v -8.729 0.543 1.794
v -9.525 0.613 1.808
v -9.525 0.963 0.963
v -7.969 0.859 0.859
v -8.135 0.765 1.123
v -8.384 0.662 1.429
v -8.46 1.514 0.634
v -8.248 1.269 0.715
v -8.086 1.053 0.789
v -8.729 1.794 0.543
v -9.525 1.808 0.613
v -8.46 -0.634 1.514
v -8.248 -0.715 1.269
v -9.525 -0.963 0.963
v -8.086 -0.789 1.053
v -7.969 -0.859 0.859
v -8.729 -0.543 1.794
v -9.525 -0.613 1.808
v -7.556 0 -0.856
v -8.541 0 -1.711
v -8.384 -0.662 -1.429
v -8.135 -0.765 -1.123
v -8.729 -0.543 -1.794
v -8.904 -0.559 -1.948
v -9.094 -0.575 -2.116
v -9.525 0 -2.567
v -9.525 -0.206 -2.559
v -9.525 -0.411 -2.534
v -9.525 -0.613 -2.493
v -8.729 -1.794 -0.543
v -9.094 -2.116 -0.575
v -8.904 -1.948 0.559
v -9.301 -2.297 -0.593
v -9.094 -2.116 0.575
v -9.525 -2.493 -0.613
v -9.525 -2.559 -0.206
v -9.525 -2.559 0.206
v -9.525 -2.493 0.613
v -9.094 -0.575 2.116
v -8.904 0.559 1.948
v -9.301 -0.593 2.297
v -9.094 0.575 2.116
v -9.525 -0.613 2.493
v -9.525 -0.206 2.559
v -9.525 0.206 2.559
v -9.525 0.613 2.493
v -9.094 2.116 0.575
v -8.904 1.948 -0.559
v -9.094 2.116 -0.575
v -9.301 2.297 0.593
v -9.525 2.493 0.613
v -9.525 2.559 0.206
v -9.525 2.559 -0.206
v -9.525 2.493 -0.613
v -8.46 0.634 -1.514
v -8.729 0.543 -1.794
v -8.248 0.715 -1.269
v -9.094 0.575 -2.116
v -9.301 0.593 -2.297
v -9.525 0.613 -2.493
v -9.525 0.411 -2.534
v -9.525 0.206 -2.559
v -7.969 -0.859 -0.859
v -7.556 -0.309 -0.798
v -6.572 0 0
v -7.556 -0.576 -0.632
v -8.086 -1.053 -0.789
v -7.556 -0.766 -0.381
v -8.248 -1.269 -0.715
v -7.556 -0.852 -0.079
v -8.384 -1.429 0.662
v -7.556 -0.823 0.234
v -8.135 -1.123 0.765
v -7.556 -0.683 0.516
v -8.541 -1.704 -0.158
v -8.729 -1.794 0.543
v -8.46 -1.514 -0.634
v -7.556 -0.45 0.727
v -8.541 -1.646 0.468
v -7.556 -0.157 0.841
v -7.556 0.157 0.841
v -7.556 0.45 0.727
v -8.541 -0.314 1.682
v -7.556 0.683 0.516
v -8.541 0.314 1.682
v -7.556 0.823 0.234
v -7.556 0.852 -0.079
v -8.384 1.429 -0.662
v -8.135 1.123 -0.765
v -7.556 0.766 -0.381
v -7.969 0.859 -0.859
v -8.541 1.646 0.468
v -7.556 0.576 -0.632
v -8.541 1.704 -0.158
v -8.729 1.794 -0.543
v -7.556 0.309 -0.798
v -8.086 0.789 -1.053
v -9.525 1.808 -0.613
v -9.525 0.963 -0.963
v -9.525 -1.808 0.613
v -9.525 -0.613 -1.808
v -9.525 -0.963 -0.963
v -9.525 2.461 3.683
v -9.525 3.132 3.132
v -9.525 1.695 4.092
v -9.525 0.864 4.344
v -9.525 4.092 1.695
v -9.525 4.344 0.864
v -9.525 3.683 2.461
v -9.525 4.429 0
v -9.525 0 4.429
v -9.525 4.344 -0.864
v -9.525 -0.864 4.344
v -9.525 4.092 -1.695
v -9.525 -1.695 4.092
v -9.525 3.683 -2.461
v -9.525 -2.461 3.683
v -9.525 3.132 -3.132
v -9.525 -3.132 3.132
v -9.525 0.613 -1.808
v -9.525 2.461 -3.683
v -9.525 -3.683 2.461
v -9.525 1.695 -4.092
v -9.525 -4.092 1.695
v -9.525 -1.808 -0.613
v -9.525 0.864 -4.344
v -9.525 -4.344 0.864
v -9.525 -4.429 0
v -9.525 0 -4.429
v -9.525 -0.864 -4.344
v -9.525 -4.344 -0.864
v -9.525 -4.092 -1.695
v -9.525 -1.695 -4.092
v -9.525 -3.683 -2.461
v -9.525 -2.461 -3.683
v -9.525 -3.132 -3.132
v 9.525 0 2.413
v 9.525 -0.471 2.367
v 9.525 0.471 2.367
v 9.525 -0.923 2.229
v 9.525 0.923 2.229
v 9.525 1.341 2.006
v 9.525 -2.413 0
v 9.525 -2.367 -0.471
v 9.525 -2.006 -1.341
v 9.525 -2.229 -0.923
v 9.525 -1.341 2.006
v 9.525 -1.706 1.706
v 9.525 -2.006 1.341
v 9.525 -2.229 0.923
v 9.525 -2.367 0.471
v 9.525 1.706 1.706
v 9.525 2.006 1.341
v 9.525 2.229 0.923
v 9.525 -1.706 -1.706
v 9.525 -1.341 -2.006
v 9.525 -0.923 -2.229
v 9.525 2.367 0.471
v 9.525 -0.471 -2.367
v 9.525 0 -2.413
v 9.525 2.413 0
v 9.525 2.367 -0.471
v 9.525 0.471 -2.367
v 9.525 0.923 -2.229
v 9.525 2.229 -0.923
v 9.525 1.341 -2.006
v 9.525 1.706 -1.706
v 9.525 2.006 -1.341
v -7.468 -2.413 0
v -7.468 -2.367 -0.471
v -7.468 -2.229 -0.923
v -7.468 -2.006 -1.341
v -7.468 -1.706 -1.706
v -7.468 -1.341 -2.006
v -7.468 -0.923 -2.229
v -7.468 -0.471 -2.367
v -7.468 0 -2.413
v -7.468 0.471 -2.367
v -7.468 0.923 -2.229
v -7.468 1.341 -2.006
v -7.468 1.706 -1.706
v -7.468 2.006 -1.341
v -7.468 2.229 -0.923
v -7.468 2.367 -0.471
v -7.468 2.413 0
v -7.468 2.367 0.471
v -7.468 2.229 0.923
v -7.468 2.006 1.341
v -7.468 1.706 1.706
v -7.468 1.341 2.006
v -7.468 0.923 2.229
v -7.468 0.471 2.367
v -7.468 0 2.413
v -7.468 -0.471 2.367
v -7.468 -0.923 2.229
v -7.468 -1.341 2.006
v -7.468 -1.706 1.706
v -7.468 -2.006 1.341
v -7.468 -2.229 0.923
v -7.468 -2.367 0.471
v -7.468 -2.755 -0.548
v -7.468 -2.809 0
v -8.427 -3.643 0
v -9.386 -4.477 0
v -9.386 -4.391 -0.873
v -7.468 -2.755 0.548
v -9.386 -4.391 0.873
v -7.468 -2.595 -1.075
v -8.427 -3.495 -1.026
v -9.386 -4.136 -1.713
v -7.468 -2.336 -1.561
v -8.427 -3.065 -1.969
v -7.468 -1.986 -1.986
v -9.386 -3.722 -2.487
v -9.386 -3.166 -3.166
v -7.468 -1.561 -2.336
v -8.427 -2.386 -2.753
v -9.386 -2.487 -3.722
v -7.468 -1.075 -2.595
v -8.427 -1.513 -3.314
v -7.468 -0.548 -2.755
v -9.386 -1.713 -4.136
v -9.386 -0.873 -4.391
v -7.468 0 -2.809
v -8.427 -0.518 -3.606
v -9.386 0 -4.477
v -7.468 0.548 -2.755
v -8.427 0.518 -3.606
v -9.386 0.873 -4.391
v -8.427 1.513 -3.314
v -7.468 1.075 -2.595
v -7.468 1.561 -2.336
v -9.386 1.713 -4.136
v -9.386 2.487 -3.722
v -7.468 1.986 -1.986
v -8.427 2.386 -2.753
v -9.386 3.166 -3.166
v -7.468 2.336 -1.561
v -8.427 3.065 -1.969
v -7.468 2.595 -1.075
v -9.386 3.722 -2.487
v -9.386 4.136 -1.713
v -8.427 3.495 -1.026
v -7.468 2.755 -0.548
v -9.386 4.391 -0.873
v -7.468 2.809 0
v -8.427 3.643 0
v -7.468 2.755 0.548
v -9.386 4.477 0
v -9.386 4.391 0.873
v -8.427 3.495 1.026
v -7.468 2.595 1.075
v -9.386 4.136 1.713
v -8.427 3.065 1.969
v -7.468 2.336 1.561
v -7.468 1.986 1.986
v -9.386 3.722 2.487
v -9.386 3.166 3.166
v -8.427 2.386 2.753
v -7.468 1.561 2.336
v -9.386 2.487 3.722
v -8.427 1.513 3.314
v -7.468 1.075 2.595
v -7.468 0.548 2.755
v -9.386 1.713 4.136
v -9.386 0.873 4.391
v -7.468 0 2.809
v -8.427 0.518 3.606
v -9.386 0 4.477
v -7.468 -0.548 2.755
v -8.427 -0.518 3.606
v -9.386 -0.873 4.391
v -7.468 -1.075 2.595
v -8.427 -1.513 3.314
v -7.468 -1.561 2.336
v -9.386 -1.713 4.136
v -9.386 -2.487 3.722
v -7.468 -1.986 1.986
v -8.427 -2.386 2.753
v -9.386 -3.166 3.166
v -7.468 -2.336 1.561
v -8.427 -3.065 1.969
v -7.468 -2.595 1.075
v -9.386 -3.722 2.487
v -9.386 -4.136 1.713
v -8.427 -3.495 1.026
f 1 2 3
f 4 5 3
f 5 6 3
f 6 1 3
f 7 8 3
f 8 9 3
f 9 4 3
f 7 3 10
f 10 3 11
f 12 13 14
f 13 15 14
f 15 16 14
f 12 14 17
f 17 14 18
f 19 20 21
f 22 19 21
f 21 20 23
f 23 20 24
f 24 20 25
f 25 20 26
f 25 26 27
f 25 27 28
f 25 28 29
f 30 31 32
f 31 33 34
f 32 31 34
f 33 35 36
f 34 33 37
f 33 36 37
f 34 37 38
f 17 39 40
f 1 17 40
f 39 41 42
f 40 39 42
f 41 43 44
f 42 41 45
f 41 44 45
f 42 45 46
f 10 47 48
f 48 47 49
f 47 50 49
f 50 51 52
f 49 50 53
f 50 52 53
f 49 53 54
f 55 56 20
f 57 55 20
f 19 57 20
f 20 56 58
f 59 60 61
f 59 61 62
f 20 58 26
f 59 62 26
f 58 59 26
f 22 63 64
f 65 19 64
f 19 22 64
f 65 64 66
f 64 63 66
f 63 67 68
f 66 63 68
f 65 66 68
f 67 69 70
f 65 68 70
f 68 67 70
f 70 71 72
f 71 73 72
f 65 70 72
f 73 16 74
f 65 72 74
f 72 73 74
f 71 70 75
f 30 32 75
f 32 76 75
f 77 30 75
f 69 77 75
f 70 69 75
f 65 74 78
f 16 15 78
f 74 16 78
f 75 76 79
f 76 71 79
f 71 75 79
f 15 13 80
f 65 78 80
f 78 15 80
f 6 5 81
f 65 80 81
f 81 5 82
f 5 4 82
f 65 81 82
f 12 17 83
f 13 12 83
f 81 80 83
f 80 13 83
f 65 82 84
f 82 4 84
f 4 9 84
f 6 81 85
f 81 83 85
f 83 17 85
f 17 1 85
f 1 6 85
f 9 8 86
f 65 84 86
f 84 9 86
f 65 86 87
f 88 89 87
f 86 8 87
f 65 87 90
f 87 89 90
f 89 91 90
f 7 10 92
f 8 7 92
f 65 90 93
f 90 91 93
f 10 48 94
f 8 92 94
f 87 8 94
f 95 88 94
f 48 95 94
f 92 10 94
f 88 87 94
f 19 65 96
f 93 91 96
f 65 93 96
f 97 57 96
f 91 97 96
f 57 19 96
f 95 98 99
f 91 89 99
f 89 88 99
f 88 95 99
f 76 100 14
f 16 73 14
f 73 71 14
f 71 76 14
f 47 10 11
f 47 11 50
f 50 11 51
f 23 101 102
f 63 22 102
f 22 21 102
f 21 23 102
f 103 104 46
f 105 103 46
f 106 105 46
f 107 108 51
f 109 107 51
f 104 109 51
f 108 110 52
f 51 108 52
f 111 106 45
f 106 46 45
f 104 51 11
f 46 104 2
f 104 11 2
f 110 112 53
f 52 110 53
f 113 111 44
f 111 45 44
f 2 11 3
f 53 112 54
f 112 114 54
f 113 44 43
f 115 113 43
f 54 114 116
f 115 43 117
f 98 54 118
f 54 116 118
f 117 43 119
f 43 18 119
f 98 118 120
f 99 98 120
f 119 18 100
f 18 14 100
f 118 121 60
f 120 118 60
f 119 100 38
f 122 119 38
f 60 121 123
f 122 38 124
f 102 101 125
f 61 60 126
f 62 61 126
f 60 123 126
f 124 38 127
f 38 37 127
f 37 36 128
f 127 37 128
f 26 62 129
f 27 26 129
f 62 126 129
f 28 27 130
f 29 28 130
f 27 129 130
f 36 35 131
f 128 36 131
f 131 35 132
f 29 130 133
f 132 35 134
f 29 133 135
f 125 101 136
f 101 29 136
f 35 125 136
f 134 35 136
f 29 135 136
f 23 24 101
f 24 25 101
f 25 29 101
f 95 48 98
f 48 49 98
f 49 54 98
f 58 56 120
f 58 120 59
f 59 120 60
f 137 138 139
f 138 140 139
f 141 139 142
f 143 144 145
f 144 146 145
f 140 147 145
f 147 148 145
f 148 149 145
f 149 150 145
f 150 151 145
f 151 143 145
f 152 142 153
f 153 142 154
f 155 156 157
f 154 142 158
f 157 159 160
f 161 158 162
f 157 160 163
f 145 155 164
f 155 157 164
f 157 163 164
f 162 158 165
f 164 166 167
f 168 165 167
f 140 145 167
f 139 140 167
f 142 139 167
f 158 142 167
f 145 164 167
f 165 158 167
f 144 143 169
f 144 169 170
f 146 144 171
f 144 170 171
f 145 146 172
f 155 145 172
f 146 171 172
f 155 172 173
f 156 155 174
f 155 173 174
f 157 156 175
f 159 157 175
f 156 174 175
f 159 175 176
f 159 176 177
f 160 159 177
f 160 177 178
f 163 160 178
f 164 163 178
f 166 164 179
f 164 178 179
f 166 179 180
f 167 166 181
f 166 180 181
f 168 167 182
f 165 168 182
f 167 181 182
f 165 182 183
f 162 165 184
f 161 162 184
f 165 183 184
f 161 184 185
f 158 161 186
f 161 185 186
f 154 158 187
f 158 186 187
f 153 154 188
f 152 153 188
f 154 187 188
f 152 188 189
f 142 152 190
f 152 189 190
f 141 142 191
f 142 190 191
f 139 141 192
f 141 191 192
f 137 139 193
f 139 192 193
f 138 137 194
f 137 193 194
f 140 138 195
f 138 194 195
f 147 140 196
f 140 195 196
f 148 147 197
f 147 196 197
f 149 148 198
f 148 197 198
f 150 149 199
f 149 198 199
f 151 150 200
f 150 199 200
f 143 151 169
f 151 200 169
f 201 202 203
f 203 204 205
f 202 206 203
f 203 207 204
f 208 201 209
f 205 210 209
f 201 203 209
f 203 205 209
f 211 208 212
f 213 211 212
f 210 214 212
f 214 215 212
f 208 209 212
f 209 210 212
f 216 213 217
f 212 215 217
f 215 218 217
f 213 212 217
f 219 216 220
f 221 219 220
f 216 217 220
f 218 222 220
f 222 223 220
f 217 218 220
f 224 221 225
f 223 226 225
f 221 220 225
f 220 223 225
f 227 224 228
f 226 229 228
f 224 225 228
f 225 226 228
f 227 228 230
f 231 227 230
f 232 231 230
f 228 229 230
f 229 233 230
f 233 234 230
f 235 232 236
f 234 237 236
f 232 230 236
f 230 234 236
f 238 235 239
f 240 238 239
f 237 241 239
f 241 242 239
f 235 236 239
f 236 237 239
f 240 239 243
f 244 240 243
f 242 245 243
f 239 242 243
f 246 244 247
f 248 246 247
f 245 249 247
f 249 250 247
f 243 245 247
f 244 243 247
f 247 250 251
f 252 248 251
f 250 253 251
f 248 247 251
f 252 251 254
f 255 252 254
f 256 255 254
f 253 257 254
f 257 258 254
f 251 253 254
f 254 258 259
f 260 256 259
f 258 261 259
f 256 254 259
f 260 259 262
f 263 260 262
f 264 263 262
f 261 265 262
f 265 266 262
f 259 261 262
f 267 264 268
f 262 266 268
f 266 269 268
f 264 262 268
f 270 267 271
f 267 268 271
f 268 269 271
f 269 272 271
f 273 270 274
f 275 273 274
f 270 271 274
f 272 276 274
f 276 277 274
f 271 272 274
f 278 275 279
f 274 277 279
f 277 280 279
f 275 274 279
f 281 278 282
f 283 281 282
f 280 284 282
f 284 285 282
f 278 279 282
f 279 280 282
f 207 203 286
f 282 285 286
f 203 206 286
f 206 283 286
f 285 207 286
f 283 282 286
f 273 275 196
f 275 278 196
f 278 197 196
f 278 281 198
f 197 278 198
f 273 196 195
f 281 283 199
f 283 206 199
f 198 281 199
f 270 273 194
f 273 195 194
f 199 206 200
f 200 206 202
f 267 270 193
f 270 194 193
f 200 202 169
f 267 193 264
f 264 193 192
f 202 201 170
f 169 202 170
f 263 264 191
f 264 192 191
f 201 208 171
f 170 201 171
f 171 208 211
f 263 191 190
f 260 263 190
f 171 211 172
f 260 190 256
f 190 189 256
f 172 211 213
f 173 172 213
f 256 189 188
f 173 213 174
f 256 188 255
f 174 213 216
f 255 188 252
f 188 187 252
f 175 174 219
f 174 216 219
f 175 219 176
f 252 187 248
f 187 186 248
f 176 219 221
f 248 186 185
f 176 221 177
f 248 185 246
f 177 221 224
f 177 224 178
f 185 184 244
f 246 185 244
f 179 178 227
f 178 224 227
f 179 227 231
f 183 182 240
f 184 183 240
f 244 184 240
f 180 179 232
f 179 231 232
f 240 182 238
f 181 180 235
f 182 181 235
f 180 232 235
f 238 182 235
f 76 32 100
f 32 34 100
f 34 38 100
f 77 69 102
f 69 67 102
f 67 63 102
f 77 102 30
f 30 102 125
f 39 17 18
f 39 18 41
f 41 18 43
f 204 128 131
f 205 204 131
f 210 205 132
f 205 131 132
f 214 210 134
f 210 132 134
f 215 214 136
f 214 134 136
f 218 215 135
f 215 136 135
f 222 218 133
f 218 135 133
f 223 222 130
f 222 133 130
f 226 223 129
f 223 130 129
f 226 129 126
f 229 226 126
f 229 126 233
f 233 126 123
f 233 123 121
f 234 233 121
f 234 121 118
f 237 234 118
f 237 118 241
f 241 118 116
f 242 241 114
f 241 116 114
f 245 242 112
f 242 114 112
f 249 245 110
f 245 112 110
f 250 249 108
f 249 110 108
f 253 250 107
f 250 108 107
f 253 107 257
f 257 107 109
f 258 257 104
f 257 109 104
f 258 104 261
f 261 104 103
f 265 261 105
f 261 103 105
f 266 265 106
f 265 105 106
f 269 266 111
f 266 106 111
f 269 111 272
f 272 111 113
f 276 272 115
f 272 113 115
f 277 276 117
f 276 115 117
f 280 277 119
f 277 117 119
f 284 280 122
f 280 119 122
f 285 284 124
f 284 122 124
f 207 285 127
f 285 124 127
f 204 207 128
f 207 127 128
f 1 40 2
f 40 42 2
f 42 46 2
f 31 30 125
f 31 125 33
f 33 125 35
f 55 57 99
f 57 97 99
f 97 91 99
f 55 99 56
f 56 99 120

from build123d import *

# Parameters (mm, degrees)
CUT_EXTRUDE1_REACH = 22.129
CIRPATTERN1_COUNT  = 4
DRAFT1_ANGLE       = 5
CHAMFER1_SIZE      = 0.183896
CHAMFER1_SIZE2     = 0.168435197


with BuildPart() as part:
    # Sketch2 → Revolve1 (revolve)
    with BuildSketch(Plane.XY, mode=Mode.PRIVATE) as revolve1_sk:
        Polygon((-9.525, 0), (9.525, 0), (9.525, 2.413), (-7.4676, 2.413), (-7.4676, 2.808929466), (-9.525, 4.5974), align=None)
    revolve(revolve1_sk.sketch.rotate(Axis((-9.525, 0, 0), (1, 0, 0)), 180), axis=Axis((-9.525, 0, 0), (1, 0, 0)))

    # Cut-Extrude1: up to this cone (the profile starts inside it)
    cut_extrude1_end = Plane(origin=(-9.525, 0, 0), z_dir=(-1, 0, 0)).offset(-2.952835668) * Cone(1e-06, 24.469290226, 28.148697423, align=(Align.CENTER, Align.CENTER, Align.MIN), mode=Mode.PRIVATE)
    # Sketch3 → Cut-Extrude1 (cut, up to the surface)
    with BuildSketch(Plane.ZY.offset(9.525), mode=Mode.PRIVATE) as cut_extrude1_sk1:
        with BuildLine():
            Line((0, 0), (3.064933333, 0))
            ThreePointArc((3.064933333, 0), (3.04941298, 0.308053268), (3.003009105, 0.612986667))
            Line((3.003009105, 0.612986667), (1.807997886, 0.612986667))
            Line((1.807997886, 0.612986667), (0.962997349, 0.962997349))
            Line((0.962997349, 0.962997349), (0.612986667, 1.807997886))
            Line((0.612986667, 1.807997886), (0.612986667, 3.003009105))
            ThreePointArc((0.612986667, 3.003009105), (0.308053268, 3.04941298), (0, 3.064933333))
            Line((0, 3.064933333), (0, 0))
        make_face()
    cut_extrude1_tool1 = extrude(cut_extrude1_sk1.sketch, amount=-CUT_EXTRUDE1_REACH, mode=Mode.PRIVATE) & cut_extrude1_end
    cut_extrude1 = cut_extrude1_tool1.solids().sort_by_distance((-9.525, 1.532467, 0.043345))[0]
    add(cut_extrude1, mode=Mode.SUBTRACT)

    # CirPattern1: Cut-Extrude1 ×4 about axis
    cirpattern1_axis = Axis((0, 0, 0), (1, 0, 0))
    for i in range(1, CIRPATTERN1_COUNT):
        add(cut_extrude1.rotate(cirpattern1_axis, i * 360 / CIRPATTERN1_COUNT), mode=Mode.SUBTRACT)

    # Draft1
    draft1_faces = [part.faces().sort_by_distance(p)[0] for p in [
        (-9.272207982, 0.612986667, -2.036620878),
        (-8.957922731, 0.804804583, -1.344908471),
        (-8.957922731, 1.344908471, -0.804804583),
        (-9.272207982, 2.036620878, -0.612986667),
        (-9.272207982, 2.036620878, 0.612986667),
        (-8.957922731, 1.344908471, 0.804804583),
        (-8.957922731, 0.804804583, 1.344908471),
        (-9.272207982, 0.612986667, 2.036620878),
        (-9.272207982, -0.612986667, 2.036620878),
        (-8.957922731, -0.804804583, 1.344908471),
        (-8.957922731, -1.344908471, 0.804804583),
        (-9.272207982, -2.036620878, 0.612986667),
        (-9.272207982, -2.036620878, -0.612986667),
        (-8.957922731, -1.344908471, -0.804804583),
        (-8.957922731, -0.804804583, -1.344908471),
        (-9.272207982, -0.612986667, -2.036620878),
    ]]
    draft(draft1_faces, Plane(origin=(-9.525, 0, 0), x_dir=(0, -1, 0), z_dir=(-1, 0, 0)), DRAFT1_ANGLE)

    # Chamfer1
    chamfer1_edges = [part.edges().sort_by_distance(p)[0] for p in [
        (-9.525, 4.5974, 0),
    ]]
    chamfer1_side = [part.faces().sort_by_distance(p)[0] for p in [
        (-8.4963, 3.703164733, 0),
    ]]
    chamfer(chamfer1_edges, length=CHAMFER1_SIZE, length2=CHAMFER1_SIZE2, reference=chamfer1_side[0])


solid = part.part
